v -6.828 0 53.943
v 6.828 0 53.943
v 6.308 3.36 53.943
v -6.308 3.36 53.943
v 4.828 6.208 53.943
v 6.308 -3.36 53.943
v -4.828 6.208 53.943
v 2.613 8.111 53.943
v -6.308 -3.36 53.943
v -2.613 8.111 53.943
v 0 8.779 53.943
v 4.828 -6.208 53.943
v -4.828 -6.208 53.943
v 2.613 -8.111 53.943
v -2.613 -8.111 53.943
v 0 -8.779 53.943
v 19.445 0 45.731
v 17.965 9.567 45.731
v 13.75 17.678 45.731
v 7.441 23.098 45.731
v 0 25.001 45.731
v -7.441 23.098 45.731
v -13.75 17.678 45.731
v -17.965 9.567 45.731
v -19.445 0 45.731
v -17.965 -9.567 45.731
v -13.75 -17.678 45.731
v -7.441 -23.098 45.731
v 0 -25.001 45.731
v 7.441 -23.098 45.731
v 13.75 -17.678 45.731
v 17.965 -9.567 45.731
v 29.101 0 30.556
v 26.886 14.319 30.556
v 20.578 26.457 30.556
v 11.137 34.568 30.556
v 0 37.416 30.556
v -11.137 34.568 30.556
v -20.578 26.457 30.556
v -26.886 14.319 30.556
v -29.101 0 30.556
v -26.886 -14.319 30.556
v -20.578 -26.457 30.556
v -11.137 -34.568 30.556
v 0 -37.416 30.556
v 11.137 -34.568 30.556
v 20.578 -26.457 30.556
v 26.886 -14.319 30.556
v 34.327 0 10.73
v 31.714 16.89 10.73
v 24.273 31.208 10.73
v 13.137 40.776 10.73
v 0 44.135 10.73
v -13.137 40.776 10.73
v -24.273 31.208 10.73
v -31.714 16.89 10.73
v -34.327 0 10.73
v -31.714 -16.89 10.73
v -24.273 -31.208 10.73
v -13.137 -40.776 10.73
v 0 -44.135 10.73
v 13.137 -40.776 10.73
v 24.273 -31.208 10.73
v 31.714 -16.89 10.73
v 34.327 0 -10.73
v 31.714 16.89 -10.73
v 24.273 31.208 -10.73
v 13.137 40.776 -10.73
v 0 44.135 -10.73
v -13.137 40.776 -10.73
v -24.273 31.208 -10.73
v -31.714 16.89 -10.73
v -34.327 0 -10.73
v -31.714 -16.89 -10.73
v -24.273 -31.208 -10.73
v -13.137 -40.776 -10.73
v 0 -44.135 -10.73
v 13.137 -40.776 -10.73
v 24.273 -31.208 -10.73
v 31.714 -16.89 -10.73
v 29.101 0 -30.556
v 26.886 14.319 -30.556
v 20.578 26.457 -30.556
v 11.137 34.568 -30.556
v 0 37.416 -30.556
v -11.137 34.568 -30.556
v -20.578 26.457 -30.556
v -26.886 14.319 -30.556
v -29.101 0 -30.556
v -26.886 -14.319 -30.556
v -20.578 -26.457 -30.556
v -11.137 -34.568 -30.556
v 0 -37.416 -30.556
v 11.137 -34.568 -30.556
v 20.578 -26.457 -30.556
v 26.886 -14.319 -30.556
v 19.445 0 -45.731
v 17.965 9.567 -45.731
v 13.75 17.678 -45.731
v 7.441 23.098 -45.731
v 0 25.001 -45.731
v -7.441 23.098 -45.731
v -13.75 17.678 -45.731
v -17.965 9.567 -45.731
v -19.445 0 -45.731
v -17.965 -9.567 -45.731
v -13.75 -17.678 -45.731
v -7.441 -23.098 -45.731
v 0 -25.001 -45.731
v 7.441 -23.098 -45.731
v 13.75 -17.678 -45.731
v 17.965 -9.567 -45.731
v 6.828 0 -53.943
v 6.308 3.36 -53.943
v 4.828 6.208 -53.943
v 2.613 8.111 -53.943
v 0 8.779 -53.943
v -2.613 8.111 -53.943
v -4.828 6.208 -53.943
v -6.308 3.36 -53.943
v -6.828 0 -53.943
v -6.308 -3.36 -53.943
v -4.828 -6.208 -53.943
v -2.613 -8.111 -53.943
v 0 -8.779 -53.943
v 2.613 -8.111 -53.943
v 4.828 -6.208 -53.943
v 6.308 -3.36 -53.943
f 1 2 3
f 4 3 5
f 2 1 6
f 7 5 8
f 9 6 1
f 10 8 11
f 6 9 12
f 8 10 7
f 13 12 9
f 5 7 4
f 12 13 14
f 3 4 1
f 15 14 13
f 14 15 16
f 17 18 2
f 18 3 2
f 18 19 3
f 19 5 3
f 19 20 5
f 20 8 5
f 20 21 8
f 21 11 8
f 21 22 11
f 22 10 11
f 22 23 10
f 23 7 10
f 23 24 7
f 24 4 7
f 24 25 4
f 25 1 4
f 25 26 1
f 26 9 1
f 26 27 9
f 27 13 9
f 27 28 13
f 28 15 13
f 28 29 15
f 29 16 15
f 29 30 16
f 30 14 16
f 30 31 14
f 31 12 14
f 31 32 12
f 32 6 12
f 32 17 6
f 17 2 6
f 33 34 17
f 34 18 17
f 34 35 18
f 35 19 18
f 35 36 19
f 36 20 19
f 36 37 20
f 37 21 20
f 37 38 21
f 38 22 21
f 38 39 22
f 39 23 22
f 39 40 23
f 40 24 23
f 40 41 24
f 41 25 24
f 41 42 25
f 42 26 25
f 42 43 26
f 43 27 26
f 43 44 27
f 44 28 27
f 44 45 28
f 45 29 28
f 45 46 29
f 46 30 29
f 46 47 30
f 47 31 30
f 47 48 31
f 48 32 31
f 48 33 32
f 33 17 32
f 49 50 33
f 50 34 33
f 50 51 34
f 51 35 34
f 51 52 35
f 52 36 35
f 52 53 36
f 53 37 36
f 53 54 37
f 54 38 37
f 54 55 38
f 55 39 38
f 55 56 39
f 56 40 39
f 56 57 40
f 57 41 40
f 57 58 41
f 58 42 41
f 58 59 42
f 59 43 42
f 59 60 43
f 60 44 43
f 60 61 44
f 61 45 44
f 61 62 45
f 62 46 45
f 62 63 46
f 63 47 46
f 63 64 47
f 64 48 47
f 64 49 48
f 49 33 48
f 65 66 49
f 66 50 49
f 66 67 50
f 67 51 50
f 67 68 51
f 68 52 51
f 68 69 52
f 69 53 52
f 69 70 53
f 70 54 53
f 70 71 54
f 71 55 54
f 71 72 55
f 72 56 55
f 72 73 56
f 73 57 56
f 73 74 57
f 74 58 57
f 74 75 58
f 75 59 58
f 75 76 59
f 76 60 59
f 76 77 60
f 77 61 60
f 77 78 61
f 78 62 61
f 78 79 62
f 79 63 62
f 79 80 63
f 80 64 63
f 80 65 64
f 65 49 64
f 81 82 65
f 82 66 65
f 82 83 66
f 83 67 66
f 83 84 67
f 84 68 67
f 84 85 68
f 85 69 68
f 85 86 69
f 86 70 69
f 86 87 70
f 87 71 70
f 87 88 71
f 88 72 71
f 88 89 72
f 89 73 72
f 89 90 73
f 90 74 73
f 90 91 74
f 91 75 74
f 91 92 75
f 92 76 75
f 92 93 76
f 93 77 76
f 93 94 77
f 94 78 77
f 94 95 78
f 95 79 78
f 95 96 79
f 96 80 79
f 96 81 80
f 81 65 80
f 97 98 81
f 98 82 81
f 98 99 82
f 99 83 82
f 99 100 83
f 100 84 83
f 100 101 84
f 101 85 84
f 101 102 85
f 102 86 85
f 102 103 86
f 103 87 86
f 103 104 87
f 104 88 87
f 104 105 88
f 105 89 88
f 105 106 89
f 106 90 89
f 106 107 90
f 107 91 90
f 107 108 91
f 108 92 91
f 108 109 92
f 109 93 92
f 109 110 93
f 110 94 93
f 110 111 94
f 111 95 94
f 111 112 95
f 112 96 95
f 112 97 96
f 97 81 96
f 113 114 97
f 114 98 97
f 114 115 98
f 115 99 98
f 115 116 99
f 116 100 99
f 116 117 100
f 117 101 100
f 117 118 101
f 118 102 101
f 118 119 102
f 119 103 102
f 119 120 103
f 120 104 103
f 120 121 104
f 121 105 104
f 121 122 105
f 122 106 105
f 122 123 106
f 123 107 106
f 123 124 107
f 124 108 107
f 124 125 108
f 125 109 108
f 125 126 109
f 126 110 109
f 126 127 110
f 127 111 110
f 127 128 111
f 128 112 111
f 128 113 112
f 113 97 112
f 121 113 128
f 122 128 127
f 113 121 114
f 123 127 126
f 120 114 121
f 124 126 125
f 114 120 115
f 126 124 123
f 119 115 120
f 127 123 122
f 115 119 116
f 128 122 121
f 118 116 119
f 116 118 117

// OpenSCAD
// Generated by SolidPython 1.0.1 on 2020-07-29 00:46:47


scale(v = [7, 9, 11]) {
	sphere(r = 5);
}
/***********************************************
*********      SolidPython code:      **********
************************************************
 
# import packages: SolidPython
from solid import *
from solid.utils import *
from itertools import chain, combinations, permutations


class Resize:

    def __init__(self, scad_file):
        self.scad_file = scad_file
        #self.scad_file = import_scad(scad_file)
        # cone/cylinder param:
        self.r1 = 0
        self.r2 = 0
        self.h = 0
        # rectangular prism param:
        self.w = 0
        self.l = 0
        # ellipse param:
        self.r = 0

    # import OpenScad code (file name corresponds to shape)


    # classify shape + parameters
    def assign(self, param1, param2, param3):
        if self.scad_file == 'cone.scad':
            self.r1 = param1
            self.r2 = param2
            self.h = param3
        elif self.scad_file == 'cylinder.scad':
            self.r1 = param1
            self.r2 = param2
            self.h = param3
        elif self.scad_file == 'rectangularPrism.scad':
            self.h = param1
            self.l = param2
            self.w = param3
        else:
            self.r = param1
            self.h = param2

    # resize parameters
    def iterate(self):
        x = range(3, 20, 2)
        i = 1
        if self.scad_file == 'cone.scad':
            tempList = list(permutations(x, 2))
            for temp in tempList:
                param1 = temp[0]
                param2 = temp[1]
                filepath = 'produced_scad_files/' + 'cone' + str(param1) + '_' + str(param2) + '_' + '.scad'
                scad_render_to_file(cylinder(h=param1, r1=param2, r2=0), filepath)

        elif self.scad_file == 'cylinder.scad':
            tempList = list(permutations(x, 3))
            for temp in tempList:
                param1 = temp[0]
                param2 = temp[1]
                filepath = 'produced_scad_files/' + 'cylinder' + str(param1) + '_' + str(param2) + '_' + '.scad'
                scad_render_to_file(cylinder(h=param1, r1=param2, r2=param2), filepath)

        elif self.scad_file == 'rectangularPrism.scad':
            tempList = list(permutations(x, 3))
            for temp in tempList:
                param1 = temp[0]
                param2 = temp[1]
                param3 = temp[2]
                filepath = 'produced_scad_files/' + 'rectangularPrism' + str(param1) + '_' + str(param2) + '_' + str(
                    param3) + '.scad'
                scad_render_to_file(cube(size=(param1, param2, param3)), filepath)

        elif self.scad_file == 'ellipse.scad':
            tempList = list(permutations(x, 4))
            for temp in tempList:
                param1 = temp[0]
                param2 = temp[1]
                param3 = temp[2]
                param4 = temp[3]
                filepath = 'produced_scad_files/' + 'ellipse' + str(param1) + '_' + str(param2) + '_' + str(param3) + '_' + str(param4) + '.scad'
                scad_render_to_file(scale([param1, param2, param3])(sphere(r=param4)), filepath)

    def render_to_scadfile(self):
        scad_render_to_file(scad, 'example.scad') 
 
************************************************/
